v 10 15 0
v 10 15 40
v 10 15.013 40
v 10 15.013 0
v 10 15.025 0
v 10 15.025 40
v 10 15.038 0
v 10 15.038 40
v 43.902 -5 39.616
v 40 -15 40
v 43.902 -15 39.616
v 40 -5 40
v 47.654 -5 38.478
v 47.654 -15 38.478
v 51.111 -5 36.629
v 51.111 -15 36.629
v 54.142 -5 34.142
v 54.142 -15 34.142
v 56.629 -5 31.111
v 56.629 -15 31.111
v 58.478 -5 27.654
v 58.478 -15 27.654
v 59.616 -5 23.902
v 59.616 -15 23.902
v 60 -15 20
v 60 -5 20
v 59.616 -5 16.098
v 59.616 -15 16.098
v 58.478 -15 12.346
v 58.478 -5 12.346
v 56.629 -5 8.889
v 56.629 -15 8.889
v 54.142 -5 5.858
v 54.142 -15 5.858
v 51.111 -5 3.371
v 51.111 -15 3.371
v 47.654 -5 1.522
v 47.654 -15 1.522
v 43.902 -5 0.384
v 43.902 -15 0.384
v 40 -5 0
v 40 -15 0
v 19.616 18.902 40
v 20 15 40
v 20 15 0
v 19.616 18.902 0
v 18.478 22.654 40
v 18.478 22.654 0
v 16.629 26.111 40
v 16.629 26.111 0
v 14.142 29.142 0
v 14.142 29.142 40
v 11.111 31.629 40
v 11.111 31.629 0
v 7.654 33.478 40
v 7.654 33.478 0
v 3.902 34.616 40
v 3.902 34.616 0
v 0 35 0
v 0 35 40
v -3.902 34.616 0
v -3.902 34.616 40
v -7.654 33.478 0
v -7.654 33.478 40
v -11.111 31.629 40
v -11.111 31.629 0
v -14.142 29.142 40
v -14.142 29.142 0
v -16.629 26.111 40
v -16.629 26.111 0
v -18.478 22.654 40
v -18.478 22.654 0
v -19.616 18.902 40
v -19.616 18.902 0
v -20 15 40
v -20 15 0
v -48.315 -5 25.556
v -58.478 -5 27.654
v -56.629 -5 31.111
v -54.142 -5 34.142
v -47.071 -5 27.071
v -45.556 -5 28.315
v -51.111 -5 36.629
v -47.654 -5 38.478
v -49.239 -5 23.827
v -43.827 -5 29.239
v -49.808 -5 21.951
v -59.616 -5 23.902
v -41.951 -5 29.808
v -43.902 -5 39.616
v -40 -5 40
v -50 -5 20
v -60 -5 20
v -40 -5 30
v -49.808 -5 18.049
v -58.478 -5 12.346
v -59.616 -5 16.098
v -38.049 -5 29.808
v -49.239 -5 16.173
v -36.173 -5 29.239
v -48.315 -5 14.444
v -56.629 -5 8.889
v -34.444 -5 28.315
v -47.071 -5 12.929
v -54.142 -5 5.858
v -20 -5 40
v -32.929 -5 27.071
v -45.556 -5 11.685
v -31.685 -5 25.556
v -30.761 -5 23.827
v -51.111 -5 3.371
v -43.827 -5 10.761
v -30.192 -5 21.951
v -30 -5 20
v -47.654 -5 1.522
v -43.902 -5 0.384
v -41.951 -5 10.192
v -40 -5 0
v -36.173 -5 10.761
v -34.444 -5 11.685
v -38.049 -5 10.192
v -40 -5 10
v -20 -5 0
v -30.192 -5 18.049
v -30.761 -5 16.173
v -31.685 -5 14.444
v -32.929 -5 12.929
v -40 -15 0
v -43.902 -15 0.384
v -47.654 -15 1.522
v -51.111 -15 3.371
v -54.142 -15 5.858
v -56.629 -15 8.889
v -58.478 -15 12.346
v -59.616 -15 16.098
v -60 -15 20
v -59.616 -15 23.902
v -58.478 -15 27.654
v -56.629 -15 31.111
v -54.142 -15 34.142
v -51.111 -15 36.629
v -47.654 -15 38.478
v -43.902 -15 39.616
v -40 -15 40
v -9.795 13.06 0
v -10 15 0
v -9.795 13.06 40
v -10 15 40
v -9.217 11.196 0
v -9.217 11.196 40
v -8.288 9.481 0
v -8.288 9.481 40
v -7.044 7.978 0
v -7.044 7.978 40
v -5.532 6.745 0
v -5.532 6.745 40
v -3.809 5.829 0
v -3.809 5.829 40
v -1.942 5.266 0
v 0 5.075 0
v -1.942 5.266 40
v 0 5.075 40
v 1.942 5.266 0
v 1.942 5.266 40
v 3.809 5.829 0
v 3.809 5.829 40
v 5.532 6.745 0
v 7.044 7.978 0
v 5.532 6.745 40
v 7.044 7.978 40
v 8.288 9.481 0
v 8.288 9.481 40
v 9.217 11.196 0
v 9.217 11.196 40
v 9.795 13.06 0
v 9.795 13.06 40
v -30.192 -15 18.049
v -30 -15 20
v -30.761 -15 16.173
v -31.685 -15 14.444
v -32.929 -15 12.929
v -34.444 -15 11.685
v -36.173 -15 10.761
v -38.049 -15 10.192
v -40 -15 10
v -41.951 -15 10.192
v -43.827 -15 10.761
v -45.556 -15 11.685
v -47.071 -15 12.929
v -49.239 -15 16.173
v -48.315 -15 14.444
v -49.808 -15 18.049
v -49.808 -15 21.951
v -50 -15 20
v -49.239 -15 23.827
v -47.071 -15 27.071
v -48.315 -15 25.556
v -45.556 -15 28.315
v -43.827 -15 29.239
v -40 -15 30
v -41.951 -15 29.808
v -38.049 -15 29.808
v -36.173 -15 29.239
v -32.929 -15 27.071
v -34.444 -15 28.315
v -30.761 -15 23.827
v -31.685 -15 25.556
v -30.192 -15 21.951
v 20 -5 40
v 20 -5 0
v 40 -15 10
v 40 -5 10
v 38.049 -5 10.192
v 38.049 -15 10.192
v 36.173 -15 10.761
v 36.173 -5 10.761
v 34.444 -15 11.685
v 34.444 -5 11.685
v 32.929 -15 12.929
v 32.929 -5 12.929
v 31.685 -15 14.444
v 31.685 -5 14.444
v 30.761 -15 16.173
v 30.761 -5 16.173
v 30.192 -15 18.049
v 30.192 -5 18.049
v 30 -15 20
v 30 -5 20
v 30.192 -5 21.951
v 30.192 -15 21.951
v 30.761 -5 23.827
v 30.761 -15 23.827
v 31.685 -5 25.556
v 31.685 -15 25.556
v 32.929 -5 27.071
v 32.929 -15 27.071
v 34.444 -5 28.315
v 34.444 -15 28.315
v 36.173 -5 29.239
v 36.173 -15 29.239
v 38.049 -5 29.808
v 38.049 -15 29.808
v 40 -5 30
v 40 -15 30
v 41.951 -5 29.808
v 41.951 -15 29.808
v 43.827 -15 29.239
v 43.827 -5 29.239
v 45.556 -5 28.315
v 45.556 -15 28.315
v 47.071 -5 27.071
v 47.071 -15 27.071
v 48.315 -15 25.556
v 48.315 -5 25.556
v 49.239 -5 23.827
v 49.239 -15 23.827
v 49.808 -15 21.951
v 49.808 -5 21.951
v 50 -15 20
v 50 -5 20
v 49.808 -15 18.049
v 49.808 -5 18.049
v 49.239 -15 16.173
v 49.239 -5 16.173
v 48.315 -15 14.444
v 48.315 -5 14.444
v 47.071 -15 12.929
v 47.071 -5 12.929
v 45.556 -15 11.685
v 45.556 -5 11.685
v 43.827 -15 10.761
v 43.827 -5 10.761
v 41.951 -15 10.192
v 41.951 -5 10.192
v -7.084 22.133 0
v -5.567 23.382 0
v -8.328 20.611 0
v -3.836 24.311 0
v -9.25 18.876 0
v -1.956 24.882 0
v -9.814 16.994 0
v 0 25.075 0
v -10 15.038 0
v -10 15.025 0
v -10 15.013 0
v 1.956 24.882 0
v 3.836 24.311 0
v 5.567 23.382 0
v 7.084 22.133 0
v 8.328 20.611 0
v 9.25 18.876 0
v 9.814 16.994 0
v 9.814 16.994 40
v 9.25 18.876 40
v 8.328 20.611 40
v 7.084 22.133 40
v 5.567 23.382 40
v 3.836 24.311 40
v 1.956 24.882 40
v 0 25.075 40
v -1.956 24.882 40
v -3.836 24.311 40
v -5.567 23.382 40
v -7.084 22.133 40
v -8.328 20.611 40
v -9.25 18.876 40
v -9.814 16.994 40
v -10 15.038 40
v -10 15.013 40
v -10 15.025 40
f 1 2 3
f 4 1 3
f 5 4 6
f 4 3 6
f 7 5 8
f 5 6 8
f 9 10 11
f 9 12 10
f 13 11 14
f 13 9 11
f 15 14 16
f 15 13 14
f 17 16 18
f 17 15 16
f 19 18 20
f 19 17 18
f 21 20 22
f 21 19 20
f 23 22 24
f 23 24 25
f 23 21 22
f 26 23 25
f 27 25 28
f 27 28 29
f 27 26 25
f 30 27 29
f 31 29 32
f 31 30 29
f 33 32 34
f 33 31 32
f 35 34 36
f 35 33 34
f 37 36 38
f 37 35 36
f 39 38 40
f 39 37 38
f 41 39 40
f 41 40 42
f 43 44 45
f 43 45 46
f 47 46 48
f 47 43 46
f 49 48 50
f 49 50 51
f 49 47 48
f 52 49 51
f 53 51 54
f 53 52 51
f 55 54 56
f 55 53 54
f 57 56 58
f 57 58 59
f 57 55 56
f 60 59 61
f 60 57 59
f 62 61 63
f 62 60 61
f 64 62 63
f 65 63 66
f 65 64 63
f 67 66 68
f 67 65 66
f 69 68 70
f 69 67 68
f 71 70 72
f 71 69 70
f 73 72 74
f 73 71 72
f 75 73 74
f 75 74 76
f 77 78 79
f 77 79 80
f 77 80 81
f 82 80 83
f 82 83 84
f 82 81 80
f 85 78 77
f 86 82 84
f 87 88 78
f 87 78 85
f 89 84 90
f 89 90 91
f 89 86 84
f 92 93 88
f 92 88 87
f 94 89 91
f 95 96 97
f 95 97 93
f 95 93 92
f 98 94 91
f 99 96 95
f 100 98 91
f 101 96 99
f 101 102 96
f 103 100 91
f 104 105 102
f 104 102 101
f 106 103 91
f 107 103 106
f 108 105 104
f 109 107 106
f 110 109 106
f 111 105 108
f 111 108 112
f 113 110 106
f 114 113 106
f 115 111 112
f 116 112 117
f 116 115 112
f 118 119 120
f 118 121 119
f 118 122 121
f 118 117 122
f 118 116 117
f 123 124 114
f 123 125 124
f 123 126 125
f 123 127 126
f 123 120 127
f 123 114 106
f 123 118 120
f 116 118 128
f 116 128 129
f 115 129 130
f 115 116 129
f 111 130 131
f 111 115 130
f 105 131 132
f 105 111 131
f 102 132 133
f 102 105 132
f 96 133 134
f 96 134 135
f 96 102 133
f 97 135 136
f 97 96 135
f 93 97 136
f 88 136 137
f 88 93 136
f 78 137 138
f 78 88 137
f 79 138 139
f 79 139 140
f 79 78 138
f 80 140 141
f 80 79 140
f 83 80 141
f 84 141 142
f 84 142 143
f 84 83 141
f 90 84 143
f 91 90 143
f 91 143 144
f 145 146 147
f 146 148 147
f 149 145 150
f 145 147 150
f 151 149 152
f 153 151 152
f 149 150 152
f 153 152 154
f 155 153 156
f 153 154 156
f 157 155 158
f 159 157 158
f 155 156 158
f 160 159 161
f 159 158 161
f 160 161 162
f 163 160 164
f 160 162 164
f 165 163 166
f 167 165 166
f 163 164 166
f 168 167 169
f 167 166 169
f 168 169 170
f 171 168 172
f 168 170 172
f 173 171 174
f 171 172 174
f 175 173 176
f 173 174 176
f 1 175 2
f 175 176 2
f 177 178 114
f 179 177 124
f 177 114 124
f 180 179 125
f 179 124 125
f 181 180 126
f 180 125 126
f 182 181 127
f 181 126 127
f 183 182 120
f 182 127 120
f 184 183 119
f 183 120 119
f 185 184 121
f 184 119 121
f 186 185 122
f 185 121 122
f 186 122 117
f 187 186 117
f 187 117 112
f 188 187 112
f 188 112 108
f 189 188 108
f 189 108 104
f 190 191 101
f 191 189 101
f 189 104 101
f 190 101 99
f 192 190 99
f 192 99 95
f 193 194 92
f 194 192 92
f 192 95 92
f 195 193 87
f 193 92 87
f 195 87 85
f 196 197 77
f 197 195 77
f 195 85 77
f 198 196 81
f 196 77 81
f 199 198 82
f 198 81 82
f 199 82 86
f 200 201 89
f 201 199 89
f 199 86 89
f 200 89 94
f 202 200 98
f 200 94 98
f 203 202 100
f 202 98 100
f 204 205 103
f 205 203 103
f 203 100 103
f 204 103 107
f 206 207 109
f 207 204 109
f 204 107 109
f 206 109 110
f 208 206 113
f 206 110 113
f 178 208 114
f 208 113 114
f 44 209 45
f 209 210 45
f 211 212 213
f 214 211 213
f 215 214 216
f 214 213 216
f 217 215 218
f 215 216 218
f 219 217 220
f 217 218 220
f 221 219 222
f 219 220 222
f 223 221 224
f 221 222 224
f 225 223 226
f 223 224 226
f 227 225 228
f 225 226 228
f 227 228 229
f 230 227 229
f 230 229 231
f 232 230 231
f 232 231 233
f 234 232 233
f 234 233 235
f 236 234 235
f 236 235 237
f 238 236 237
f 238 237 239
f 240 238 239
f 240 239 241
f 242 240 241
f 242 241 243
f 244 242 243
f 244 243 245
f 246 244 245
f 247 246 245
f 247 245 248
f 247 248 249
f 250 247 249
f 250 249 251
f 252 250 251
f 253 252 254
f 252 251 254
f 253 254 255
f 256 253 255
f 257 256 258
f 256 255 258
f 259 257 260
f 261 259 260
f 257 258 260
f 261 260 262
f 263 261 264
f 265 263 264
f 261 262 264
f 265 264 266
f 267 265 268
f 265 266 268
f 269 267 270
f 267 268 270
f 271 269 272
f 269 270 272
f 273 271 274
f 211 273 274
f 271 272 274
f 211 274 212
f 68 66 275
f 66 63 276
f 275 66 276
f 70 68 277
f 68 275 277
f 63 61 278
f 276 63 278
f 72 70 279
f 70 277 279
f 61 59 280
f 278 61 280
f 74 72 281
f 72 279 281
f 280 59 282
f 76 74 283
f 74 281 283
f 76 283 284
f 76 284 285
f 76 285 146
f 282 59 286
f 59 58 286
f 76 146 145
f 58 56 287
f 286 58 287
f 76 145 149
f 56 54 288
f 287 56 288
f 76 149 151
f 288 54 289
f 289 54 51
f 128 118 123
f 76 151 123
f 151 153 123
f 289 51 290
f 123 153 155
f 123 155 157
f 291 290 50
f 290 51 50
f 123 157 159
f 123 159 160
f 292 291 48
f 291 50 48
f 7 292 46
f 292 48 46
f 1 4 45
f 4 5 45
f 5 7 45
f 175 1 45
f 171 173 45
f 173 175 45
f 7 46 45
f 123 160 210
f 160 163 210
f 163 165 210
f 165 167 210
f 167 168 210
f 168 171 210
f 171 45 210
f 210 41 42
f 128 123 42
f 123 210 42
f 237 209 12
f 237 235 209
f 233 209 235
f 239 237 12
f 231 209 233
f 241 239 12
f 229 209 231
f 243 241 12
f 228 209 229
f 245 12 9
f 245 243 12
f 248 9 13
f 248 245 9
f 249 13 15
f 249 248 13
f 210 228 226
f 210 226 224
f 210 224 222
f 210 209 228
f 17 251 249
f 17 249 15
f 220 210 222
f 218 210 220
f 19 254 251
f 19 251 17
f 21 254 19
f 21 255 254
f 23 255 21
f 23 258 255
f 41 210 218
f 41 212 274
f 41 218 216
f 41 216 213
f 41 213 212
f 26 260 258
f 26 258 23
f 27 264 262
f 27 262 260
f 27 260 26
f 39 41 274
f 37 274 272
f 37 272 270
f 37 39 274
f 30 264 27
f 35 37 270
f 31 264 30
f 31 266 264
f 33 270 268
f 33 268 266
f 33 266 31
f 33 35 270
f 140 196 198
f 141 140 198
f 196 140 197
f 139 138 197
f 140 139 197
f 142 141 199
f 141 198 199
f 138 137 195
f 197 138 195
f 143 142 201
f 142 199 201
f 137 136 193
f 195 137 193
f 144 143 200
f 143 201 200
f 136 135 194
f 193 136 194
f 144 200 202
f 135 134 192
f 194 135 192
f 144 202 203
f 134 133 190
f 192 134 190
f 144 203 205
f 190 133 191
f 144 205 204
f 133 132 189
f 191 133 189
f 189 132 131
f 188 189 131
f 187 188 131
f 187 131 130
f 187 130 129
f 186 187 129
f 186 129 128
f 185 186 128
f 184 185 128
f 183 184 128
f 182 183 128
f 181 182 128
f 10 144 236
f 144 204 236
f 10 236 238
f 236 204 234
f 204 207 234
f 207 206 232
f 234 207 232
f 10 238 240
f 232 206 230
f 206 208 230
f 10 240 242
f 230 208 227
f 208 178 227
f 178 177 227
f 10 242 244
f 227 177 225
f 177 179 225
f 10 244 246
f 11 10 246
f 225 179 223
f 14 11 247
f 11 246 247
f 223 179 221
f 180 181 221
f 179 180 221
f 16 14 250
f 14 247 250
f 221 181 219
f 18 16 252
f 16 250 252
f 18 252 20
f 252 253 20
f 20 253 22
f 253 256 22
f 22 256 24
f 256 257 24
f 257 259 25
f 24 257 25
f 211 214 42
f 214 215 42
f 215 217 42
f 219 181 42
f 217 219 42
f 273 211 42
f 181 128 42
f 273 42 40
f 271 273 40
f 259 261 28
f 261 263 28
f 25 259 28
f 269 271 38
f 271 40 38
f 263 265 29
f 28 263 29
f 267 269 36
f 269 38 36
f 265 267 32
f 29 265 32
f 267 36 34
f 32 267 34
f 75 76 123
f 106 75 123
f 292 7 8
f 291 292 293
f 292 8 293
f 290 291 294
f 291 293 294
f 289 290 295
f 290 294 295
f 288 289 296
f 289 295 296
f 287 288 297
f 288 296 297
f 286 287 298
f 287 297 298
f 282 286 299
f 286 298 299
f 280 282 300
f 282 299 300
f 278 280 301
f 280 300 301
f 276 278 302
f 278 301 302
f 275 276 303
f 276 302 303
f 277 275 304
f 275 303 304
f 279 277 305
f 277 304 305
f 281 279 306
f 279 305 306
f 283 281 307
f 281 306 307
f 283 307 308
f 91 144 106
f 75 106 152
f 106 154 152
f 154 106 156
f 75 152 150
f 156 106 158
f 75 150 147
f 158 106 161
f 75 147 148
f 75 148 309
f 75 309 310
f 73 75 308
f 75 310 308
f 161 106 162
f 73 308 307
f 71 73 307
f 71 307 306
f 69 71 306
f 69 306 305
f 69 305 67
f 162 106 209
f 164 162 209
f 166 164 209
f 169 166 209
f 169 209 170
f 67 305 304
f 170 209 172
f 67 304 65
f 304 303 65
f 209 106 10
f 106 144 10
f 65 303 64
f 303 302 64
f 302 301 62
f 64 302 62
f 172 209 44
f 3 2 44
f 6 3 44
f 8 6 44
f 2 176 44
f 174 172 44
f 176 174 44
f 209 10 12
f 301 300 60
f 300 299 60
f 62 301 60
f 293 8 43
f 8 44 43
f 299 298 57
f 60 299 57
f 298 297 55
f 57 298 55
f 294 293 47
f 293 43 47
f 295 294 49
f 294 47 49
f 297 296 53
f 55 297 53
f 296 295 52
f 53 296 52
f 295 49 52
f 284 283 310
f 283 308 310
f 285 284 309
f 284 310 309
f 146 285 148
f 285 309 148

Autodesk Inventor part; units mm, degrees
ref_plane "YZ Plane" through (0, 0, 0) normal (1, 0, 0) x (0, 1, 0)
ref_plane "XZ Plane" through (0, 0, 0) normal (0, 1, 0) x (-1, 0, 0)
ref_plane "XY Plane" through (0, 0, 0) normal (0, 0, 1) x (1, 0, 0)
sketch "Boceto1" plane through (0, 0, 0) normal (0, 0, 1) x (1, 0, 0)
  line L0 (-20, -15) -> (20, -15)
  line L1 (20, -15) -> (20, 15)
  line L2 (20, 15) -> (-20, 15)
  line L3 (-20, 15) -> (-20, -15)
  line L4 (-20, -15) -> (20, 15) construction
  line L5 (20, -15) -> (-20, 15) construction
  point P0 (0, 0)
  dimension "d0" = 40
  dimension "d1" = 30
extrude "Extrusión1" add sketch "Boceto1" along normal blind 40
sketch "Boceto2" plane through (0, 0, 40) normal (0, 0, 1) x (1, 0, 0)
  line L0 (20, 15) -> (-20, 15) projected
  circle A0 centre (0, 15) radius 10
  circle A1 centre (0, 15) radius 20
  point P0 (0, 0)
  point P1 (-10, 15)
  point P2 (10, 15)
  dimension "d4" = 20
extrude "Extrusión2" add sketch "Boceto2" against normal blind 40 contours L0 A0 A1 picked at (-3.5694, 31.1605)
sketch "Boceto3" plane through (0, 0, 40) normal (0, 0, 1) x (1, 0, 0)
  circle A0 centre (0, 15.0754) radius 10
  point P0 (0, 0)
  dimension "d7" = 20
extrude "Extrusión3" cut sketch "Boceto3" against normal blind 40
sketch "Boceto4" plane through (20, -15, 40) normal (1, 0, 0) x (0, 0, -1)
  line L0 (40, 30) -> (40, 0) projected
  line L1 (40, 0) -> (0, 0)
  line L2 (0, 0) -> (0, 10)
  line L3 (0, 10) -> (40, 10)
  line L4 (40, 10) -> (40, 0)
  point P0 (40, 15)
  dimension "d10" = 40
  dimension "d11" = 10
extrude "Extrusión4" add sketch "Boceto4" along normal blind 20
sketch "Boceto5" plane through (20, -5, 40) normal (0, 1, 0) x (1, 0, 0)
  line L0 (20, 40) -> (20, 0) projected
  circle A0 centre (20, 20) radius 10
  circle A1 centre (20, 20) radius 20
  point P0 (-20, 40)
  point P1 (20, 30)
  point P2 (20, 10)
  dimension "d14" = 20
extrude "Extrusión5" add sketch "Boceto5" against normal blind 10 contours A1 L0 A0 picked at (36.4159, 17.7748)
sketch "Boceto6" plane through (20, -5, 40) normal (0, 1, 0) x (1, 0, 0)
  line L0 (20, 10) -> (20, 30) projected
  circle A0 centre (20, 20) radius 10
  point P0 (-20, 40)
  dimension "d17" = 20
extrude "Extrusión6" cut sketch "Boceto6" against normal blind 10 contours A0 L0 picked at (18.4509, 17.0485)
sketch "Boceto7" plane through (-20, -15, 0) normal (-1, 0, 0) x (0, 0, 1)
  point P0 (0, 15)
sketch "Boceto8" plane through (-20, -15, 0) normal (-1, 0, 0) x (0, 0, 1)
  line L0 (0, 0) -> (40, 0) projected
  line L1 (0, 0) -> (40, 0)
  line L2 (40, 0) -> (40, 10)
  line L3 (40, 10) -> (0, 10)
  line L4 (0, 10) -> (0, 0)
  point P0 (0, 15)
  dimension "d20" = 40
  dimension "d21" = 10
extrude "Extrusión7" add sketch "Boceto8" along normal blind 20
sketch "Boceto9" plane through (-20, -5, 40) normal (0, 1, 0) x (1, 0, 0)
  line L0 (-20, 40) -> (-20, 0) projected
  circle A0 centre (-20, 20) radius 10
  circle A1 centre (-20, 20) radius 20
  point P0 (20, 40)
  point P1 (-20, 10)
  point P2 (-20, 30)
  dimension "d24" = 20
  dimension "d25" = 40
extrude "Extrusión8" add sketch "Boceto9" against normal blind 10 contours L0 A0 A1 picked at (-22.3932, 3.6239)
sketch "Boceto10" plane through (-20, -5, 40) normal (0, 1, 0) x (1, 0, 0)
  line L0 (-20, 30) -> (-20, 10) projected
  circle A0 centre (-20, 20) radius 10
  point P0 (20, 40)
  dimension "d28" = 20
extrude "Extrusión9" cut sketch "Boceto10" against normal blind 10 contours A0 L0 picked at (-17.3939, 17.9217)
thread "Rosca1" size "M20x2.5" class "6H" standard "ANSI Metric M Profile" full length
thread "Rosca2" size "M20x2.5" class "6H" standard "ANSI Metric M Profile" full length
thread "Rosca3" size "M20x2.5" class "6H" standard "ANSI Metric M Profile" full length
thread "Rosca4" size "M20x2.5" class "6H" standard "ANSI Metric M Profile" full length
properties part number "Tarea#1 Adrian Montalvan"
